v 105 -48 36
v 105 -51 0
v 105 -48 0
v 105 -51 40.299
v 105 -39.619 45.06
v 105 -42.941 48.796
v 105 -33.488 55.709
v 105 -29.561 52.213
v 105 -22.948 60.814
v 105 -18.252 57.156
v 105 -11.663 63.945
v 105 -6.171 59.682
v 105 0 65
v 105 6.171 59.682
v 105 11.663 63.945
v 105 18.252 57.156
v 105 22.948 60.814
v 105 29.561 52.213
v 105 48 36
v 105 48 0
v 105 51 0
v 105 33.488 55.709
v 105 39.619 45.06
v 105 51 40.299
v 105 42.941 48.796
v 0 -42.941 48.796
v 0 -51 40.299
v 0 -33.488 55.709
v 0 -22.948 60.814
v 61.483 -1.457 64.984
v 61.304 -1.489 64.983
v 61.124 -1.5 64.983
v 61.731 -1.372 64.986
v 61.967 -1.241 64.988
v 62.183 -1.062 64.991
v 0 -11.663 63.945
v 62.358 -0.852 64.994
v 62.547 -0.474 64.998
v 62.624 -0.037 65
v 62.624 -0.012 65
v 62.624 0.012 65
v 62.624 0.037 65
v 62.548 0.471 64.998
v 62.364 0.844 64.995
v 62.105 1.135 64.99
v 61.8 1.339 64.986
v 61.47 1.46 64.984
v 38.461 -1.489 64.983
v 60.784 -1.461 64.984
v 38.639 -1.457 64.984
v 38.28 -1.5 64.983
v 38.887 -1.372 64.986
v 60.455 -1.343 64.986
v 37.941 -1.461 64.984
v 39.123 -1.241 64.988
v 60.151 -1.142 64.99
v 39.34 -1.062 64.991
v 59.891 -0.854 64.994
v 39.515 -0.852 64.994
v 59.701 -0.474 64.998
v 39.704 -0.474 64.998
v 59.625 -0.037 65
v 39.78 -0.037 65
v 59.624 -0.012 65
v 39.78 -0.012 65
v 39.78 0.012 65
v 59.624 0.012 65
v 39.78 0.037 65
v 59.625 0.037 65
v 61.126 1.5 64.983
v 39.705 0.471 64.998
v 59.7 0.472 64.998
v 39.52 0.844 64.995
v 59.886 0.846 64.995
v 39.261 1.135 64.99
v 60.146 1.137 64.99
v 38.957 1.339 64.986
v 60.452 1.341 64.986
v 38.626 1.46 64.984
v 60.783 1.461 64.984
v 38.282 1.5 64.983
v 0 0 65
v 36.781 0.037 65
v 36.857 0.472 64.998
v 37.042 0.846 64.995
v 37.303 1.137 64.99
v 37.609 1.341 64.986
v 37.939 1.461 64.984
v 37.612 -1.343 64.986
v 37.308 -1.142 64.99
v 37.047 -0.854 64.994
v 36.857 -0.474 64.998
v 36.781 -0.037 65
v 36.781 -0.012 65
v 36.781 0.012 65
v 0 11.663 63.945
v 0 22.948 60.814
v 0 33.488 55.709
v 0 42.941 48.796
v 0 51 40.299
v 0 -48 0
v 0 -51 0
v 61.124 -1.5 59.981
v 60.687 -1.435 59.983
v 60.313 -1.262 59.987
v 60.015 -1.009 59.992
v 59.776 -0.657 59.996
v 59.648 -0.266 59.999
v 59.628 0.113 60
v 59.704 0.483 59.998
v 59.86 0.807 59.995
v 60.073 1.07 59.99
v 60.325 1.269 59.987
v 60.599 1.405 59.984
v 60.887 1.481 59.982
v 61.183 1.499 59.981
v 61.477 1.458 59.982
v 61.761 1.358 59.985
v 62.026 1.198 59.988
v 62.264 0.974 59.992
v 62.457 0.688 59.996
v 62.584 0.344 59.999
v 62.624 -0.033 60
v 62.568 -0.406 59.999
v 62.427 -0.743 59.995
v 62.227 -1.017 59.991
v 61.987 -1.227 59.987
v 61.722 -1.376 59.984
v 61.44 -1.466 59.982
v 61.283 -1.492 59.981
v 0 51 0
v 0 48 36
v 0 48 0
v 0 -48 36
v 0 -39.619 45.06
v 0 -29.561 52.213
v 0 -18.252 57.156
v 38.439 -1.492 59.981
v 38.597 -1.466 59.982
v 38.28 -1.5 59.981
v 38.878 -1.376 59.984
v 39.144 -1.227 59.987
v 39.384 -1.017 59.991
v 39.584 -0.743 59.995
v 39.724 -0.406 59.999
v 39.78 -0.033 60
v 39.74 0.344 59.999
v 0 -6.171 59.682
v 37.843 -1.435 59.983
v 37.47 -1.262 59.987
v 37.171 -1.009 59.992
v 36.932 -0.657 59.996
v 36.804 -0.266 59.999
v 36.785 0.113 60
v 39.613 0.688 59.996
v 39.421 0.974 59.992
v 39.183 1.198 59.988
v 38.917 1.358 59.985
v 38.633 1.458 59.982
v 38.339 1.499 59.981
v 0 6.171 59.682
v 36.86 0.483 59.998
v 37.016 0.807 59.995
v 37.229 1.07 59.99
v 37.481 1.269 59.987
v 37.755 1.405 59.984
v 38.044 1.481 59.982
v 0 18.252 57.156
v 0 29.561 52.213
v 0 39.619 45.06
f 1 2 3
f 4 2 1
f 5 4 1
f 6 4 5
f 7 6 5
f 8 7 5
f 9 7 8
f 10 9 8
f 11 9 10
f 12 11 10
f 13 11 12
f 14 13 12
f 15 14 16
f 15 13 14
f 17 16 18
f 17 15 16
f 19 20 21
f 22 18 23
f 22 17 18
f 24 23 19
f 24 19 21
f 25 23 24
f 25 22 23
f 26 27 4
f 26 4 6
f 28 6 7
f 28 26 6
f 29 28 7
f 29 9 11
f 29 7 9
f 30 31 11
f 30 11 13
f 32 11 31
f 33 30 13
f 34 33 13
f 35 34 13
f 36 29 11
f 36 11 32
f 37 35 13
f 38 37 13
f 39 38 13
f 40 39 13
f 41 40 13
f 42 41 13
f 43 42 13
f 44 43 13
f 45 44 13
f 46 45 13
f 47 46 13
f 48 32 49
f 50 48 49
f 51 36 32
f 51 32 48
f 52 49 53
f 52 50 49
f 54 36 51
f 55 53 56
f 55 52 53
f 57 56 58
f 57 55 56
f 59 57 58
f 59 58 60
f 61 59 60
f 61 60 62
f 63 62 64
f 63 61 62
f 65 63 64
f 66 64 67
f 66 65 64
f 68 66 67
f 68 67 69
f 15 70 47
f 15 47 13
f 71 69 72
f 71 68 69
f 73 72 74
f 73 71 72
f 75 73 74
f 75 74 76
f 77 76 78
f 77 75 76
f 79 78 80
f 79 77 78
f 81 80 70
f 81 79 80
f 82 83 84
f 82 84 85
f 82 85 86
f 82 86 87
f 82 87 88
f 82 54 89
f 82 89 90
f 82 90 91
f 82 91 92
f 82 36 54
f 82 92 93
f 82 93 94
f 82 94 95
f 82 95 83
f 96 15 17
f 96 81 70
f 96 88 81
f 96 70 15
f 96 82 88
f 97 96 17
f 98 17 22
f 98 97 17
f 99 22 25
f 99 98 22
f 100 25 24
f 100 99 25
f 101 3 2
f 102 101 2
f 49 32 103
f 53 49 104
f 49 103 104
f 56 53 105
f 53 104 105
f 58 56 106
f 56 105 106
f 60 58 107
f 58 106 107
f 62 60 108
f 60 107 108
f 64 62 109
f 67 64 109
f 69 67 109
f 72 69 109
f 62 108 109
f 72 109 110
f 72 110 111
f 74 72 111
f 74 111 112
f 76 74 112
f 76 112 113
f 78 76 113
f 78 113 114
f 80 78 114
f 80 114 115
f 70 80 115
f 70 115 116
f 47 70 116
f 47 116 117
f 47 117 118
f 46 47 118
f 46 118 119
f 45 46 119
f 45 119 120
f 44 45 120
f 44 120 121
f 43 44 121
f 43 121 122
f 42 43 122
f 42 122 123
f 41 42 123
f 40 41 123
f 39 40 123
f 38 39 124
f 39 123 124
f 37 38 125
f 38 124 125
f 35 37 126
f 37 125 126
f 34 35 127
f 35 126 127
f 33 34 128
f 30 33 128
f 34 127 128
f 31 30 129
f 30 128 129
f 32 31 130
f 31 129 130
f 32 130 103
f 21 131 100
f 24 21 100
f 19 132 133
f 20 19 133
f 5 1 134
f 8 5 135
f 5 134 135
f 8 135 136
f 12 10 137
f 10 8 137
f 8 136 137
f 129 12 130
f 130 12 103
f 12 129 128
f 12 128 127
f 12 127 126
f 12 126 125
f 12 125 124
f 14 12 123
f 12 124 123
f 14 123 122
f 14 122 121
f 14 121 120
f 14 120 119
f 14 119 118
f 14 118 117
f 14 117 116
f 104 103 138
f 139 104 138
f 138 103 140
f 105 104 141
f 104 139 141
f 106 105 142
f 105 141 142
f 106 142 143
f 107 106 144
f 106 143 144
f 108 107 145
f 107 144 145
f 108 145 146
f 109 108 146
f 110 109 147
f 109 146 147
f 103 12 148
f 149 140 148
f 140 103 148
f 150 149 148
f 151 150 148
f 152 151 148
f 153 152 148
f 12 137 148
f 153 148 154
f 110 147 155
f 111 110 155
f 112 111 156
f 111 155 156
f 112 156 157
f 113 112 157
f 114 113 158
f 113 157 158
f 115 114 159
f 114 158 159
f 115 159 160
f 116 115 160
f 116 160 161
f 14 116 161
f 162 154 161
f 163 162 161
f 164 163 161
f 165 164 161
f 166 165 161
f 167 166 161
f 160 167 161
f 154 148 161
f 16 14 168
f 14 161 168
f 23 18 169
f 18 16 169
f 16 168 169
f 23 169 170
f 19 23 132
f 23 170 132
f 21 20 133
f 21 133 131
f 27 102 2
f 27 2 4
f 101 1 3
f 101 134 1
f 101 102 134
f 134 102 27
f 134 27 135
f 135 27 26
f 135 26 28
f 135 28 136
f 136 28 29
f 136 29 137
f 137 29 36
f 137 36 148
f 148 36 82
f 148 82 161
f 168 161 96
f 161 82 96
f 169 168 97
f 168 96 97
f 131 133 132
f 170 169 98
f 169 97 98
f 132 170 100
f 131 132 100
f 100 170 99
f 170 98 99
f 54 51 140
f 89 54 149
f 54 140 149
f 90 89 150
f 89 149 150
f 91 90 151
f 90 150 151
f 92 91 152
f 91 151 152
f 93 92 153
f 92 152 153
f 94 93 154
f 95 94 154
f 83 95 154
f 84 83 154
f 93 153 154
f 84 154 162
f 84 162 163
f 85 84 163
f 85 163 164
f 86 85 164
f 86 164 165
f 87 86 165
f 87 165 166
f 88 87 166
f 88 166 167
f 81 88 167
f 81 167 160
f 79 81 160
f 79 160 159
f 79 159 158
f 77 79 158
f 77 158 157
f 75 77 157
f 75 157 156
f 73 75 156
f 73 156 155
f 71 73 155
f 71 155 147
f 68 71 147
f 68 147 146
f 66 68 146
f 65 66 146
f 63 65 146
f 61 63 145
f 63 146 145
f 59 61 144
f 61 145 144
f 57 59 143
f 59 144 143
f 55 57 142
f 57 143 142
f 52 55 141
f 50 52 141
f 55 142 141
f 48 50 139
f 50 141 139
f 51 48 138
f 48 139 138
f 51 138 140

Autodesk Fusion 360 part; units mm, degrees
sketch "Sketch1" plane through (0, 0, 0) normal (1, 0, 0) x (0, 1, 0)
  line L0 (-48, 0) -> (-51, 0)
  line L1 (-48, 0) -> (-51, 0)
  line L2 (48, 0) -> (51, 0)
  line L3 (-51, 0) -> (-51, 40.2989)
  line L4 (51, 0) -> (51, 40.2989)
  arc A0 (48, 36) -> (-48, 36) centre (0, 0) ccw
  arc A1 (51, 40.2989) -> (-51, 40.2989) centre (0, 0) ccw
  line L5 (-51, 0) -> (-48, 0)
  line L6 (-48, 15) -> (-48, 36)
  line L7 (-48, 15) -> (-48, 0)
  line L8 (48, 20.1494) -> (48, 36)
  line L9 (48, 20.1494) -> (48, 0)
  dimension "d1" = 51
  dimension "d2" = 51
  dimension "d3" = 130
extrude "Extrude1" add sketch "Sketch1" along normal blind 105
hole "Hole1" at (61.1241, 0, 65) direction (0, 0, -1) diameter 3 depth 10 tip angle 118
hole "Hole2" at (38.2805, 0, 65) direction (0, 0, -1) diameter 3 depth 10 tip angle 118
